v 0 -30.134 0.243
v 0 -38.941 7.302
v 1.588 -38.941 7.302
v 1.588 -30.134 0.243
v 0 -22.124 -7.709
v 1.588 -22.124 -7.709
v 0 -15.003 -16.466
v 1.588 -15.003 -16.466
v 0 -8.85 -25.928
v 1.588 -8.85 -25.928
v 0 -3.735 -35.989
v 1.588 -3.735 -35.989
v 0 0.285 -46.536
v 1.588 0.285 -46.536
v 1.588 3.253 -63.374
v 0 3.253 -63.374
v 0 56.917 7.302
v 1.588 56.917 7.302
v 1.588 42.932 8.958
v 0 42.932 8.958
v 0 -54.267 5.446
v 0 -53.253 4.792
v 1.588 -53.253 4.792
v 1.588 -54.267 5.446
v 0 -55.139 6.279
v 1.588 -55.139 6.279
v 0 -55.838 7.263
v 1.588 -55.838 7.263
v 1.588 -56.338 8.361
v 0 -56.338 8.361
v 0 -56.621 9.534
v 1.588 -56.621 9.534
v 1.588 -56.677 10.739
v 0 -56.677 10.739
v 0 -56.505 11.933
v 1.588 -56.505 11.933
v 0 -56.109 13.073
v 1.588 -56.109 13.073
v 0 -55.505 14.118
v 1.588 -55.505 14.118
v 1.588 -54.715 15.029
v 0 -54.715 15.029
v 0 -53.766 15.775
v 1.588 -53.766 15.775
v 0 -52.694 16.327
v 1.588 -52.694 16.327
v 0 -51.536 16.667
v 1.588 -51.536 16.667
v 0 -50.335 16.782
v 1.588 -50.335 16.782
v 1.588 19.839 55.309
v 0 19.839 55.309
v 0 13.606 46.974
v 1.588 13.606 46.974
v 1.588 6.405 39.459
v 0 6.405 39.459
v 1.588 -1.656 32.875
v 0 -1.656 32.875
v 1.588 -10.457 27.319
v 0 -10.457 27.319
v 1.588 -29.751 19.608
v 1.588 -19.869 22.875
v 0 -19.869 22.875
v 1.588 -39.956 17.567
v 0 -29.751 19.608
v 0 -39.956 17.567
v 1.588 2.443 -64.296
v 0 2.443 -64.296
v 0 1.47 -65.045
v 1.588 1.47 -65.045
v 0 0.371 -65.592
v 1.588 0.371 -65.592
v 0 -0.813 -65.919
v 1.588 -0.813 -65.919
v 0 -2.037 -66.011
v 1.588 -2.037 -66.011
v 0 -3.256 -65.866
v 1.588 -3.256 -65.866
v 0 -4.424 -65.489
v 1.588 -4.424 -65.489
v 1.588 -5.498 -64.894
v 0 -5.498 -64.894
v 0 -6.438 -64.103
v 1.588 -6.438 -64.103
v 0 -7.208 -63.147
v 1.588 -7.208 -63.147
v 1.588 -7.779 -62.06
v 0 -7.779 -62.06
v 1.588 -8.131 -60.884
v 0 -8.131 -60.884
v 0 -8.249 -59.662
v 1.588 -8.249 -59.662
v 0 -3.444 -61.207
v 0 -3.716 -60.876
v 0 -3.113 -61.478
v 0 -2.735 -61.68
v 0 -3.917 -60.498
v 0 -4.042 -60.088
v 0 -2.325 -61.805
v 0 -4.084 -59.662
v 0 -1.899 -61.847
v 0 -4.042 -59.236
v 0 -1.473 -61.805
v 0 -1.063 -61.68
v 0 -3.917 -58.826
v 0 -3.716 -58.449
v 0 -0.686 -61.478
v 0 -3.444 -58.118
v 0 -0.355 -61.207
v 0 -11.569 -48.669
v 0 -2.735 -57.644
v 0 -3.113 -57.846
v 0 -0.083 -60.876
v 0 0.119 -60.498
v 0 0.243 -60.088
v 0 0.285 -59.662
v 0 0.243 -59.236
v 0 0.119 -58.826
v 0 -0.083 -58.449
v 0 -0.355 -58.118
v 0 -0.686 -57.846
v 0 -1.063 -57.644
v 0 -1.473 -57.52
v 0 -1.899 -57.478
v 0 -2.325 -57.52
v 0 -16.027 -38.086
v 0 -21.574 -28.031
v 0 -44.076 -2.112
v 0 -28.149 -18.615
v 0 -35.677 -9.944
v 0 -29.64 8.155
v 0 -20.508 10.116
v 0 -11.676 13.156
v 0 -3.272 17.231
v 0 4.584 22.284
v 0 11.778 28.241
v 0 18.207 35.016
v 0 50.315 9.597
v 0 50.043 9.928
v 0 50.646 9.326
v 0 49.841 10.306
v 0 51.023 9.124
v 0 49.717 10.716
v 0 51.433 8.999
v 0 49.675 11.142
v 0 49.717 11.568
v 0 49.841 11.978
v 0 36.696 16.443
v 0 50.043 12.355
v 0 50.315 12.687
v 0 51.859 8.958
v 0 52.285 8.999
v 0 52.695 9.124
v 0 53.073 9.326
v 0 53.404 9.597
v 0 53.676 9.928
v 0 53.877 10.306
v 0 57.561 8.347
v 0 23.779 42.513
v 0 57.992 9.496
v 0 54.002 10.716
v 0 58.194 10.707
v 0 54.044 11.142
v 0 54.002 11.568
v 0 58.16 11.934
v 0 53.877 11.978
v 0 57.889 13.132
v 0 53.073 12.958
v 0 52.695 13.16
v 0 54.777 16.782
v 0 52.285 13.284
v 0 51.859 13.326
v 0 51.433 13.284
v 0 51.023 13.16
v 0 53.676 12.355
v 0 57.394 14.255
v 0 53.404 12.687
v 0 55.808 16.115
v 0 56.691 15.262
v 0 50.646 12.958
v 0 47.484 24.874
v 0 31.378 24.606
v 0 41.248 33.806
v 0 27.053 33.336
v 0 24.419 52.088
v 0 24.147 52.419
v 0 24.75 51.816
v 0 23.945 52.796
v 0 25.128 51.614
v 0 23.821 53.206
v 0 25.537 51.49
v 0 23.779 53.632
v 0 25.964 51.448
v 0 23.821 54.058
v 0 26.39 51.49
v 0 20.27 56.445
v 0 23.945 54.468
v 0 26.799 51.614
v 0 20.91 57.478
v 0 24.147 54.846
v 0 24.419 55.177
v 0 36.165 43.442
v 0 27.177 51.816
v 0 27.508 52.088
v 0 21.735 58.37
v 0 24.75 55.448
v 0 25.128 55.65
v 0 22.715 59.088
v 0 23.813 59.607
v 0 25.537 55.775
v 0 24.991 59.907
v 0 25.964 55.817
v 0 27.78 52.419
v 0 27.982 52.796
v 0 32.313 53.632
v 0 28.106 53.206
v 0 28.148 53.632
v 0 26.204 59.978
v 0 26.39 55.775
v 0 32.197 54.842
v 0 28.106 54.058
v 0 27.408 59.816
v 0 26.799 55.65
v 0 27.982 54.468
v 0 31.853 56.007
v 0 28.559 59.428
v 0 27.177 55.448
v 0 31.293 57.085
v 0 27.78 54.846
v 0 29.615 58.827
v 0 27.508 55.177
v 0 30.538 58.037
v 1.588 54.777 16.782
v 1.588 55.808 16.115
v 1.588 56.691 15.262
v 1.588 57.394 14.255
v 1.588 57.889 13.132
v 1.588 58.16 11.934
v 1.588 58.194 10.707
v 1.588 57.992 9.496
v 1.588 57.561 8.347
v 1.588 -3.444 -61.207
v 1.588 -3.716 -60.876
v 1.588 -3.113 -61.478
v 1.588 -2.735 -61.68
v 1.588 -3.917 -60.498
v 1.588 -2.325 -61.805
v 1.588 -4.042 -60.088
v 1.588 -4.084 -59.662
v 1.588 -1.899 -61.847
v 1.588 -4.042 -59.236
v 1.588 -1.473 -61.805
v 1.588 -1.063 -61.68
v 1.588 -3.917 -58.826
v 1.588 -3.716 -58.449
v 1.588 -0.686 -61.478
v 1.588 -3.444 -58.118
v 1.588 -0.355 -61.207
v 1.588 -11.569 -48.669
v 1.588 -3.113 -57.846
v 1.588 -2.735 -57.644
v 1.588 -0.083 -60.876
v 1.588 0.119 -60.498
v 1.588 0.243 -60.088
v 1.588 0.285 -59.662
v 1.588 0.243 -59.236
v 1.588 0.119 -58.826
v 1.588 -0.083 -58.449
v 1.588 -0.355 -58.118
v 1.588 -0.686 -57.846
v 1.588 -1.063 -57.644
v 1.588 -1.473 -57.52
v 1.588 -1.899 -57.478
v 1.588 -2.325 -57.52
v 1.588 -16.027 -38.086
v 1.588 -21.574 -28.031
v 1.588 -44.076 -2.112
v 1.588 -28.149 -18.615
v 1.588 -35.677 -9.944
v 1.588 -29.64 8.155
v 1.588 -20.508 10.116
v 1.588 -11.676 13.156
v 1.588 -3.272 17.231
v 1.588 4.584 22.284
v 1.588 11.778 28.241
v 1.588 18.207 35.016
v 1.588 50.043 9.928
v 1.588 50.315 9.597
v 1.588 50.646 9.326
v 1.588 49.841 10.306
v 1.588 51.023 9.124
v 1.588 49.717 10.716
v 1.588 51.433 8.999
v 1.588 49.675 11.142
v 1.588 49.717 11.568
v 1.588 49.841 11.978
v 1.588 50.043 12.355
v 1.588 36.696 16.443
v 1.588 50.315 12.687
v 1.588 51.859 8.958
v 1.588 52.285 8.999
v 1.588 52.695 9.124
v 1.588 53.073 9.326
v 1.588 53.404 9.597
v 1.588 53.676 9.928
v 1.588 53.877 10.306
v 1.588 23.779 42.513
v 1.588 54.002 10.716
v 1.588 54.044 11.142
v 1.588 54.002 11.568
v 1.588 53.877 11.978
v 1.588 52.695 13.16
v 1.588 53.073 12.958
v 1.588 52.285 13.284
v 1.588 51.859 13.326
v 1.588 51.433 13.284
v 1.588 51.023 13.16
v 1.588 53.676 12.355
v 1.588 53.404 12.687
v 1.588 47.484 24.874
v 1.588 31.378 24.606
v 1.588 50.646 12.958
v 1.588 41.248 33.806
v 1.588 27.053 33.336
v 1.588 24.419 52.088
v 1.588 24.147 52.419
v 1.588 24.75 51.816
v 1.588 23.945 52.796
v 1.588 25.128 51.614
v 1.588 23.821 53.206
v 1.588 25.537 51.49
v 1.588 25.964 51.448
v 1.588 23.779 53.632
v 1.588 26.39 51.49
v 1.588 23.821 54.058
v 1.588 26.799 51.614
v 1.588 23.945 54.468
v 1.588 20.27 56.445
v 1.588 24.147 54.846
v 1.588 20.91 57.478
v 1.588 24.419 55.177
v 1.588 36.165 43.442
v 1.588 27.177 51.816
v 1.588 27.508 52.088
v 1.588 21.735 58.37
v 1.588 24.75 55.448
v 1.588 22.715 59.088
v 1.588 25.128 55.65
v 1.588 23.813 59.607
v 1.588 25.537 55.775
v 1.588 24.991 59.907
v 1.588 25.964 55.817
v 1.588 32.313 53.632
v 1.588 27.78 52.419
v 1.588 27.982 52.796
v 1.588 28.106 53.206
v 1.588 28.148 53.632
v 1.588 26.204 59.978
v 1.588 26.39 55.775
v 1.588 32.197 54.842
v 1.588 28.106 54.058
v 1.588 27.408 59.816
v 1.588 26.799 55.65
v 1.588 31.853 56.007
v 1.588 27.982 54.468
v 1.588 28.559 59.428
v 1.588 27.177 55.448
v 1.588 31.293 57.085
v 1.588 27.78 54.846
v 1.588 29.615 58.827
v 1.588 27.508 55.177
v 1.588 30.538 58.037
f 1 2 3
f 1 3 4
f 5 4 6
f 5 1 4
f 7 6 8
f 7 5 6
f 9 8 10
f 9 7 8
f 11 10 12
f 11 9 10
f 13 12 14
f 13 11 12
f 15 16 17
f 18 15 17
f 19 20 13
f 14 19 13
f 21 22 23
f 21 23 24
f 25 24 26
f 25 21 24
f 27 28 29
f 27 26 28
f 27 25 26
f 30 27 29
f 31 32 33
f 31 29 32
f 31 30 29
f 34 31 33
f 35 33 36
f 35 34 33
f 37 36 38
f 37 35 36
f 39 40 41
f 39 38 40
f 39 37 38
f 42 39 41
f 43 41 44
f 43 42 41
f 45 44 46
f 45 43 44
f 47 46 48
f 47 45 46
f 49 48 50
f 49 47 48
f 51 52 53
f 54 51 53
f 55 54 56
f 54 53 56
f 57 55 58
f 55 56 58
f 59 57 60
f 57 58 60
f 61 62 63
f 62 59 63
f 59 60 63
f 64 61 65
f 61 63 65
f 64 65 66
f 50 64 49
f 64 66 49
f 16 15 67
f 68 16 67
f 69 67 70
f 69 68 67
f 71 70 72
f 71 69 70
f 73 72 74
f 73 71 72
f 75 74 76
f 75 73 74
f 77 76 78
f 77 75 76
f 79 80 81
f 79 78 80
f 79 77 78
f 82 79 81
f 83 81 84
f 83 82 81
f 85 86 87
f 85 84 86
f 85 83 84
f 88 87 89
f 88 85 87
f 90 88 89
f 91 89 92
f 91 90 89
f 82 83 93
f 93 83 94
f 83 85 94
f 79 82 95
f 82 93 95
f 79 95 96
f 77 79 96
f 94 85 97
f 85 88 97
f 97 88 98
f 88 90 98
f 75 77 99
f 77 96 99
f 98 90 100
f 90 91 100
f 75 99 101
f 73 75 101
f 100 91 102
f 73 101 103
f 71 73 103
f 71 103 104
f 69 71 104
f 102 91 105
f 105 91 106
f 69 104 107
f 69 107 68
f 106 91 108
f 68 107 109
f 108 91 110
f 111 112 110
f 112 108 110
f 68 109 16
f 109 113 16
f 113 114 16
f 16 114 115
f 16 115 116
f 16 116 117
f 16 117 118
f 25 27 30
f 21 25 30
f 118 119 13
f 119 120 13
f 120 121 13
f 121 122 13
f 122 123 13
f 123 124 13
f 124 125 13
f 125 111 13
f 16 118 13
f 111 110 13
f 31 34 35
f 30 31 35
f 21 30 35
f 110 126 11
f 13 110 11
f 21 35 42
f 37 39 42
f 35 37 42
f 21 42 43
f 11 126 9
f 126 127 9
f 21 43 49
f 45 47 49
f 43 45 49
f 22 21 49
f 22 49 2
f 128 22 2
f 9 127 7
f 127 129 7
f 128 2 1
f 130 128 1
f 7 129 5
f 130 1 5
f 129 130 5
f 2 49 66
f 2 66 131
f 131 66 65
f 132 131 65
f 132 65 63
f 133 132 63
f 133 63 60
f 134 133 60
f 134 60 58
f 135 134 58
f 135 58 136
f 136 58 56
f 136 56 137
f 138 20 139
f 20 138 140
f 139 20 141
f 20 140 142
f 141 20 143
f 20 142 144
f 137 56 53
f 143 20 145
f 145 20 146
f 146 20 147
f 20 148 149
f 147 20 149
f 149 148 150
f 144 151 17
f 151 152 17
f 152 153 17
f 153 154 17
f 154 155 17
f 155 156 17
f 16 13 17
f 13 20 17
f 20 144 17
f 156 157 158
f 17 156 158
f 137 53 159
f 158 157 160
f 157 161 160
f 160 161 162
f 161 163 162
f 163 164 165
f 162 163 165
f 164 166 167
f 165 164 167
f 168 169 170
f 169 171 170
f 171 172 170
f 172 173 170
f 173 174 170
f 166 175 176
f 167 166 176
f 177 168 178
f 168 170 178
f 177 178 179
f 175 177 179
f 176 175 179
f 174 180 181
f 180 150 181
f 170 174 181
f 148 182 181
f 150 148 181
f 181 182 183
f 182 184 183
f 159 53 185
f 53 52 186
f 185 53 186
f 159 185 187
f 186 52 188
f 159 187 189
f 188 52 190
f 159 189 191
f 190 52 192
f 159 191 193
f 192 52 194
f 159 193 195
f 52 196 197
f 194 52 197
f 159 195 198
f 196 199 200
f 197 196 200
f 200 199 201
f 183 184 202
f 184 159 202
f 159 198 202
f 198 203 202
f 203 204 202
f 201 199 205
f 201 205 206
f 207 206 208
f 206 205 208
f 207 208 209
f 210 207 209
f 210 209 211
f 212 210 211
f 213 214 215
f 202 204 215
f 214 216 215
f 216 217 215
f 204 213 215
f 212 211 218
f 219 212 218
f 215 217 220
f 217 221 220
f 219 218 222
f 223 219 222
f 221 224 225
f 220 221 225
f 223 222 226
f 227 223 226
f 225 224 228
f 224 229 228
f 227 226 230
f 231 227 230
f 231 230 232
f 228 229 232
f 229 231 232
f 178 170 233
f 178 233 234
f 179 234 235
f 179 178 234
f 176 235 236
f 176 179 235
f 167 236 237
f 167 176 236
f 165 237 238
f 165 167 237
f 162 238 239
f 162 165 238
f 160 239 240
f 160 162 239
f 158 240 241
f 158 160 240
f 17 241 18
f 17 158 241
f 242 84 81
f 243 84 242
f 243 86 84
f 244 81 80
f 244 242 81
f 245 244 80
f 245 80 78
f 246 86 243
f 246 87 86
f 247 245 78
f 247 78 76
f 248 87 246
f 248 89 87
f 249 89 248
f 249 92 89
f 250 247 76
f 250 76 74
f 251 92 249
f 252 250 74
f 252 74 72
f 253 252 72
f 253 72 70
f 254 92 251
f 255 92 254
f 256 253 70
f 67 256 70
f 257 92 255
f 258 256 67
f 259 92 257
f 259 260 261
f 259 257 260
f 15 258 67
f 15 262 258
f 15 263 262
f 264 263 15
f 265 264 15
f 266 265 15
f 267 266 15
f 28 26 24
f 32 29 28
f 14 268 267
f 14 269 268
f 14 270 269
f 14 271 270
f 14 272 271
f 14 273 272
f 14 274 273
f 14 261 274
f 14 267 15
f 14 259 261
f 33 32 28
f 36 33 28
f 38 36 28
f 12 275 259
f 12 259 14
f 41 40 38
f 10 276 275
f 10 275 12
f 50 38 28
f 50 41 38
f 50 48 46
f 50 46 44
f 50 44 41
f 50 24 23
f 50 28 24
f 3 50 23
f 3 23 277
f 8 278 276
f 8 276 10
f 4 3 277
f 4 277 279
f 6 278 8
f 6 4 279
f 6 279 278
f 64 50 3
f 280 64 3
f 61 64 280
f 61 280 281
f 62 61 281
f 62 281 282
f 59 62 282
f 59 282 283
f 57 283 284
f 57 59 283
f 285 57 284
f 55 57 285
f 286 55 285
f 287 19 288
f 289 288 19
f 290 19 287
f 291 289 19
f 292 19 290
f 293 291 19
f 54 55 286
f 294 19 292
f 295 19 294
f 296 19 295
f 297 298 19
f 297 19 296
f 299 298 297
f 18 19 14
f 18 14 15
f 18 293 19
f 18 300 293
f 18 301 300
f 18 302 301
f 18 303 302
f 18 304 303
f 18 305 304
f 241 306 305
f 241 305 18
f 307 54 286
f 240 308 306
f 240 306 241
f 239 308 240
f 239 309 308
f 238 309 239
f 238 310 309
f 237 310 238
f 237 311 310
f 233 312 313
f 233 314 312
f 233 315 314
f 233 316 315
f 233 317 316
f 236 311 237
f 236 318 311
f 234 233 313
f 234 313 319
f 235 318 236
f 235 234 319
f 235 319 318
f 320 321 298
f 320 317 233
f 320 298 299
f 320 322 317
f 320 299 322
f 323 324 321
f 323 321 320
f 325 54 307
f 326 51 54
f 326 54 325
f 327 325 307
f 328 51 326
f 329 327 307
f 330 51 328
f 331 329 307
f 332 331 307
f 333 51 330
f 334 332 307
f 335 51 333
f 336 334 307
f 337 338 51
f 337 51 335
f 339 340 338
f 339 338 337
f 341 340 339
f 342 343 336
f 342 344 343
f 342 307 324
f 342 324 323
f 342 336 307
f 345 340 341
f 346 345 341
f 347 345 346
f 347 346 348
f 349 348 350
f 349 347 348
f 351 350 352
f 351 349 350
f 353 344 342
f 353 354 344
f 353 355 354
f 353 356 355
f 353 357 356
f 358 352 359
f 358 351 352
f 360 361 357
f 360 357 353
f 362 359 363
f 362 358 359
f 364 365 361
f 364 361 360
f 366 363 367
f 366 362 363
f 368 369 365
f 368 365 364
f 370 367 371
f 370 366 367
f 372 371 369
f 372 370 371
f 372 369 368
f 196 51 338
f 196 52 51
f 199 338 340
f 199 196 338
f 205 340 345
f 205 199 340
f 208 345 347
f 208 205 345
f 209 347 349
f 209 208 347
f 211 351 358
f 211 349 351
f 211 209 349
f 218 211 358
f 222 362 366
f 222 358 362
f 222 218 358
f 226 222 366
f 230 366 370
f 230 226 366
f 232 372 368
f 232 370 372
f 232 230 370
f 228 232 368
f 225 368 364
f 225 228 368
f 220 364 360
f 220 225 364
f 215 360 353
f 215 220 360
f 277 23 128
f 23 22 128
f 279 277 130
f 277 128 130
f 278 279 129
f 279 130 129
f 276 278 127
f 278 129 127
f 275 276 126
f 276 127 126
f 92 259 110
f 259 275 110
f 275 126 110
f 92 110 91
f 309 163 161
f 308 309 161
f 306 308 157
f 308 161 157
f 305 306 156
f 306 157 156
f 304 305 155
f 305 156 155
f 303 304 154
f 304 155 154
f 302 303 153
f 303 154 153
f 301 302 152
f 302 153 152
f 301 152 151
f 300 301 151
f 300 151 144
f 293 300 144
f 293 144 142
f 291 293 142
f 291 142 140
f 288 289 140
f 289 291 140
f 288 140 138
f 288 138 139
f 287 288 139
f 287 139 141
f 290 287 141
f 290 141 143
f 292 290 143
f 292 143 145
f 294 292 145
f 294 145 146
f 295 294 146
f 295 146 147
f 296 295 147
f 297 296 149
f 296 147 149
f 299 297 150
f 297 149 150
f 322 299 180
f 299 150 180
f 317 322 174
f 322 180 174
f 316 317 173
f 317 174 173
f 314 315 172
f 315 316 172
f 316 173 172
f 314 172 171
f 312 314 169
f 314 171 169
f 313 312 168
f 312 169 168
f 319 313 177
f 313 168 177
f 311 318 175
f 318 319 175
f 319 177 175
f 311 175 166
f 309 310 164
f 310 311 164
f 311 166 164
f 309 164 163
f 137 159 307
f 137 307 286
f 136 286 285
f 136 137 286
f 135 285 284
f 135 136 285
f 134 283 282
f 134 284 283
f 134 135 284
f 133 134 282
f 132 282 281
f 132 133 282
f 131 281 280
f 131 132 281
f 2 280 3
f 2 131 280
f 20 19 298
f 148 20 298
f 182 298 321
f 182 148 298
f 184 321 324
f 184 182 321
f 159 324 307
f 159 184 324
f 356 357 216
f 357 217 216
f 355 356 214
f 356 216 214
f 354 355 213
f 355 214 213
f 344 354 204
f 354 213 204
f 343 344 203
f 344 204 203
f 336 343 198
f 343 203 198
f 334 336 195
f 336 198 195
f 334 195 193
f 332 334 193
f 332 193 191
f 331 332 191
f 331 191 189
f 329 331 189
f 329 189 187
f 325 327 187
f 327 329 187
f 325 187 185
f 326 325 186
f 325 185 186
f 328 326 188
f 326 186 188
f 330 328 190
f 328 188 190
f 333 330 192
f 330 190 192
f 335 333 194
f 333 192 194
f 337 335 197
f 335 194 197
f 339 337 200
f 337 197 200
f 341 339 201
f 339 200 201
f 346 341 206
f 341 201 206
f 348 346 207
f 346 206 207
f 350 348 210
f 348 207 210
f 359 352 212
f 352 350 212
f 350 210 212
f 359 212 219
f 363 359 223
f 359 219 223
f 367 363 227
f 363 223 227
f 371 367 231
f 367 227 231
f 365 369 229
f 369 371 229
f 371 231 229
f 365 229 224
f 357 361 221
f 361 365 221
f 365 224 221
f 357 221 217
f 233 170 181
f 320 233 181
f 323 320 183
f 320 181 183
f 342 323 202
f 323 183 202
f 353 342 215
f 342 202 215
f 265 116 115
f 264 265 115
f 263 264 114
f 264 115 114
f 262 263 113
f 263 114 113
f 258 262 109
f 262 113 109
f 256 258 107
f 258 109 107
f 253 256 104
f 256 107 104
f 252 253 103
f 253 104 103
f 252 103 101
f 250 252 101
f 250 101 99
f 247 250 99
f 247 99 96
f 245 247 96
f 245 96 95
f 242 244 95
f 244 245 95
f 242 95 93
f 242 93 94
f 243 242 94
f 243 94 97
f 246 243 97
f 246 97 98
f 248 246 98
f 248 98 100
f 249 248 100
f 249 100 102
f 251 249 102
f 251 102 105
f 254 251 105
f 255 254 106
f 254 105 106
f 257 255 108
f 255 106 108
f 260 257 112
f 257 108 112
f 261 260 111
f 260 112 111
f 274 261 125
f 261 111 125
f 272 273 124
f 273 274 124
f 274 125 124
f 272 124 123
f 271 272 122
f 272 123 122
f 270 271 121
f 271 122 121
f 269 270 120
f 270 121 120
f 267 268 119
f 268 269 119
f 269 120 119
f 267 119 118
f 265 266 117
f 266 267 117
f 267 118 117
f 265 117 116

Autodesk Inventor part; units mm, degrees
ref_plane "YZ Plane" through (0, 0, 0) normal (1, 0, 0) x (0, 1, 0)
ref_plane "XZ Plane" through (0, 0, 0) normal (0, 1, 0) x (-1, 0, 0)
ref_plane "XY Plane" through (0, 0, 0) normal (0, 0, 1) x (1, 0, 0)
sketch "Sketch1" plane through (0, 0, 0) normal (1, 0, 0) x (0, 1, 0)
  circle A0 centre (-50.3348, 10.4318) radius 6.35
  circle A1 centre (25.9635, 53.6322) radius 2.1844
  circle A2 centre (51.8593, 11.1419) radius 2.1844
  circle A3 centre (-1.8993, -59.6622) radius 2.1844
  arc A4 (-31.4874, -97.6281) -> (-30.8803, -97.2439) centre (-31.376, -97.1325) ccw
  line L0 (-31.4874, -97.6281) -> (-35.0063, -96.8369)
  arc A5 (-29.1899, -99.915) -> (-29.797, -100.2992) centre (-29.3014, -100.4107) ccw
  arc A6 (-31.4874, -97.6281) -> (-30.8803, -97.2439) centre (-31.376, -97.1325) ccw
  line L1 (-35.0063, -96.8369) -> (-31.4874, -97.6281)
  arc A7 (-37.6774, -98.5273) -> (-38.0616, -97.9203) centre (-38.1731, -98.4159) ccw
  line L2 (-38.0616, -97.9203) -> (-39.8211, -97.5246)
  arc A8 (-29.1899, -99.915) -> (-29.797, -100.2992) centre (-29.3014, -100.4107) ccw
  arc A9 (-37.6774, -98.5273) -> (-38.0616, -97.9203) centre (-38.1731, -98.4159) ccw
  line L3 (-39.8211, -97.5246) -> (-38.0616, -97.9203)
  line L4 (-39.8211, -97.5246) -> (-38.0616, -97.9203)
  arc A10 (-29.1899, -99.915) -> (-29.797, -100.2992) centre (-29.3014, -100.4107) ccw
  arc A11 (-37.6774, -98.5273) -> (-38.0616, -97.9203) centre (-38.1731, -98.4159) ccw
  arc A12 (-29.1899, -99.915) -> (-29.797, -100.2992) centre (-29.3014, -100.4107) ccw
  arc A13 (-31.4874, -97.6281) -> (-30.8803, -97.2439) centre (-31.376, -97.1325) ccw
  line L5 (-31.4874, -97.6281) -> (-35.0063, -96.8369)
  arc A14 (-37.6774, -98.5273) -> (-38.0616, -97.9203) centre (-38.1731, -98.4159) ccw
  line L6 (-38.0616, -97.9203) -> (-39.8211, -97.5246)
  arc A15 (-31.4874, -97.6281) -> (-30.8803, -97.2439) centre (-31.376, -97.1325) ccw
  line L7 (-35.0063, -96.8369) -> (-31.4874, -97.6281)
  circle A16 centre (25.9635, 53.6322) radius 6.35
  circle A17 centre (51.8593, 11.1419) radius 6.35
  circle A18 centre (-1.8993, -59.6622) radius 6.35
  arc A19 (-50.3348, 16.7818) -> (19.8389, 55.3092) centre (-51.5807, 102.222) ccw
  arc A20 (32.3135, 53.6322) -> (54.7772, 16.7818) centre (116.2711, 79.5401) ccw
  arc A21 (-8.2493, -59.6622) -> (-53.2527, 4.7919) centre (-114.0974, -85.6296) ccw
  line L8 (3.2531, -63.3736) -> (56.9166, 7.3019)
  arc A22 (-38.9414, 7.3019) -> (23.7791, 42.5126) centre (-41.3896, 85.1299) ccw
  arc A23 (23.7791, 42.5126) -> (42.9324, 8.9575) centre (103.5332, 65.7926) ccw
  line L9 (42.9324, 8.9575) -> (0.2851, -46.536)
  arc A24 (0.2851, -46.536) -> (-38.9414, 7.3019) centre (-100.9359, -79.0766) ccw
  point P0 (0, 0)
  dimension "d0" = 12.7
  dimension "d1" = 12.7
  dimension "d2" = 12.7
  dimension "d3" = 12.7
extrude "Extrusion1" add sketch "Sketch1" along normal blind 1.5875
properties part number "ringblockerv2"
